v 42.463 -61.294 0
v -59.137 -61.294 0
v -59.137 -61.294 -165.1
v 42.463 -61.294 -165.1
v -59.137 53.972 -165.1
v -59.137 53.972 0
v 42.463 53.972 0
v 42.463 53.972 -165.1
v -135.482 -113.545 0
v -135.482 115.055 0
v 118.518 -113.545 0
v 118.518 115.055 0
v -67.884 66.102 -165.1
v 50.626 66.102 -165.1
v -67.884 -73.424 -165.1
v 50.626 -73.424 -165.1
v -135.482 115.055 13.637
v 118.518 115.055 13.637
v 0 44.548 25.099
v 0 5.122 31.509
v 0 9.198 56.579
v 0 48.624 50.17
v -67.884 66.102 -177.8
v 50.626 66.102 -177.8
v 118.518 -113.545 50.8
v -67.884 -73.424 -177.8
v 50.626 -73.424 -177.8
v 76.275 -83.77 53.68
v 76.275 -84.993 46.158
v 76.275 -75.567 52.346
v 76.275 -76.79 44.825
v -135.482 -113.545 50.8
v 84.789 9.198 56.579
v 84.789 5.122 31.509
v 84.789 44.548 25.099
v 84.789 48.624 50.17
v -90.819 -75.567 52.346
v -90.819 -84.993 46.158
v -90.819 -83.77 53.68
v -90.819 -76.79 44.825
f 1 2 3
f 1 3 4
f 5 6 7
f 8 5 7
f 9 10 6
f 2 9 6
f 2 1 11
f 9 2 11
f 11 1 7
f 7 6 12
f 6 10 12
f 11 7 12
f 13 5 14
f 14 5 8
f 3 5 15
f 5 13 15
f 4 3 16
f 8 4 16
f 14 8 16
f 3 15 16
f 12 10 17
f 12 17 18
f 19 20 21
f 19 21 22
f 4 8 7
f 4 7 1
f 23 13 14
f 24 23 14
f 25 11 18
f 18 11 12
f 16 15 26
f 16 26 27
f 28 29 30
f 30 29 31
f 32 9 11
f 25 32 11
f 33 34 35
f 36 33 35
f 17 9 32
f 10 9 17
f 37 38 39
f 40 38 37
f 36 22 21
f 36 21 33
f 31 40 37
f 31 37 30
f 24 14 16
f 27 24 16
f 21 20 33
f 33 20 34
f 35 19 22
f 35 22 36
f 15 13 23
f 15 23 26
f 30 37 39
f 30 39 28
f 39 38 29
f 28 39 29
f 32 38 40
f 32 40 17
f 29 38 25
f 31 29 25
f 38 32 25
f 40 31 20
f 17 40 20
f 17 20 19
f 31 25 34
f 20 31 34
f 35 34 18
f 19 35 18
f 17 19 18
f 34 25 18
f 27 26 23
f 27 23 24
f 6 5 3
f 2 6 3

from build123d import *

# Parameters (mm, degrees)
F0_W      = 254
F0_H      = 228.6
F1_DEPTH  = 50.8
F2_W      = 101.6
F2_H      = 115.2657791972
F3_DEPTH  = 165.1
F5_DEPTH  = 279.4
F6_W      = 118.5094341636
F6_H      = 139.5258828998
F7_DEPTH  = 12.7
F8_W      = 167.0939251781
F8_H      = 8.3109661937
F9_DEPTH  = 7.62
F10_W     = 84.7886428237
F10_H     = 39.9433299899
F11_DEPTH = 25.4


with BuildPart() as f1:
    # F0 (on Top) → F1 (new body)
    with BuildSketch(Plane.XY):
        with Locations((-8.4815638786, 0.7548034191)):
            Rectangle(F0_W, F0_H)
    extrude(amount=F1_DEPTH)

    # F2 (on face) → F3 (join)
    with BuildSketch(Plane(origin=(0, 0, 0), x_dir=(1, 0, 0), z_dir=(0, 0, -1))):
        with Locations((-8.3371599585, 3.6606378853)):
            Rectangle(F2_W, F2_H)
    extrude(amount=F3_DEPTH)

    # F4 (on face) → F5 (cut)
    with BuildSketch(Plane.YZ.offset(118.5184361214)):
        Polygon((115.0548034191, 50.8), (-113.5451965809, 50.8), (115.0548034191, 13.6371413246), align=None)
    extrude(amount=-F5_DEPTH, mode=Mode.SUBTRACT)

    # F6 (on face) → F7 (join)
    with BuildSketch(Plane(origin=(0, 0, -165.1), x_dir=(1, 0, 0), z_dir=(0, 0, -1))):
        with Locations((-8.6290575564, 3.6606378853)):
            Rectangle(F6_W, F6_H)
    extrude(amount=F7_DEPTH)

    # F8 (on face) → F9 (join)
    with BuildSketch(Plane(origin=(0, 5.1222588583, 31.5085657224), x_dir=(1, 0, 0), z_dir=(0, 0.1604606782, 0.9870422335))):
        with Locations((-7.2715543211, -87.1428288519)):
            Rectangle(F8_W, F8_H)
    extrude(amount=F9_DEPTH)

    # F10 (on face) → F11 (join)
    with BuildSketch(Plane(origin=(0, 5.1222588583, 31.5085657224), x_dir=(1, 0, 0), z_dir=(0, 0.1604606782, 0.9870422335))):
        with Locations((42.3943214118, 19.971664995)):
            Rectangle(F10_W, F10_H)
    extrude(amount=F11_DEPTH)


solid = f1.part
